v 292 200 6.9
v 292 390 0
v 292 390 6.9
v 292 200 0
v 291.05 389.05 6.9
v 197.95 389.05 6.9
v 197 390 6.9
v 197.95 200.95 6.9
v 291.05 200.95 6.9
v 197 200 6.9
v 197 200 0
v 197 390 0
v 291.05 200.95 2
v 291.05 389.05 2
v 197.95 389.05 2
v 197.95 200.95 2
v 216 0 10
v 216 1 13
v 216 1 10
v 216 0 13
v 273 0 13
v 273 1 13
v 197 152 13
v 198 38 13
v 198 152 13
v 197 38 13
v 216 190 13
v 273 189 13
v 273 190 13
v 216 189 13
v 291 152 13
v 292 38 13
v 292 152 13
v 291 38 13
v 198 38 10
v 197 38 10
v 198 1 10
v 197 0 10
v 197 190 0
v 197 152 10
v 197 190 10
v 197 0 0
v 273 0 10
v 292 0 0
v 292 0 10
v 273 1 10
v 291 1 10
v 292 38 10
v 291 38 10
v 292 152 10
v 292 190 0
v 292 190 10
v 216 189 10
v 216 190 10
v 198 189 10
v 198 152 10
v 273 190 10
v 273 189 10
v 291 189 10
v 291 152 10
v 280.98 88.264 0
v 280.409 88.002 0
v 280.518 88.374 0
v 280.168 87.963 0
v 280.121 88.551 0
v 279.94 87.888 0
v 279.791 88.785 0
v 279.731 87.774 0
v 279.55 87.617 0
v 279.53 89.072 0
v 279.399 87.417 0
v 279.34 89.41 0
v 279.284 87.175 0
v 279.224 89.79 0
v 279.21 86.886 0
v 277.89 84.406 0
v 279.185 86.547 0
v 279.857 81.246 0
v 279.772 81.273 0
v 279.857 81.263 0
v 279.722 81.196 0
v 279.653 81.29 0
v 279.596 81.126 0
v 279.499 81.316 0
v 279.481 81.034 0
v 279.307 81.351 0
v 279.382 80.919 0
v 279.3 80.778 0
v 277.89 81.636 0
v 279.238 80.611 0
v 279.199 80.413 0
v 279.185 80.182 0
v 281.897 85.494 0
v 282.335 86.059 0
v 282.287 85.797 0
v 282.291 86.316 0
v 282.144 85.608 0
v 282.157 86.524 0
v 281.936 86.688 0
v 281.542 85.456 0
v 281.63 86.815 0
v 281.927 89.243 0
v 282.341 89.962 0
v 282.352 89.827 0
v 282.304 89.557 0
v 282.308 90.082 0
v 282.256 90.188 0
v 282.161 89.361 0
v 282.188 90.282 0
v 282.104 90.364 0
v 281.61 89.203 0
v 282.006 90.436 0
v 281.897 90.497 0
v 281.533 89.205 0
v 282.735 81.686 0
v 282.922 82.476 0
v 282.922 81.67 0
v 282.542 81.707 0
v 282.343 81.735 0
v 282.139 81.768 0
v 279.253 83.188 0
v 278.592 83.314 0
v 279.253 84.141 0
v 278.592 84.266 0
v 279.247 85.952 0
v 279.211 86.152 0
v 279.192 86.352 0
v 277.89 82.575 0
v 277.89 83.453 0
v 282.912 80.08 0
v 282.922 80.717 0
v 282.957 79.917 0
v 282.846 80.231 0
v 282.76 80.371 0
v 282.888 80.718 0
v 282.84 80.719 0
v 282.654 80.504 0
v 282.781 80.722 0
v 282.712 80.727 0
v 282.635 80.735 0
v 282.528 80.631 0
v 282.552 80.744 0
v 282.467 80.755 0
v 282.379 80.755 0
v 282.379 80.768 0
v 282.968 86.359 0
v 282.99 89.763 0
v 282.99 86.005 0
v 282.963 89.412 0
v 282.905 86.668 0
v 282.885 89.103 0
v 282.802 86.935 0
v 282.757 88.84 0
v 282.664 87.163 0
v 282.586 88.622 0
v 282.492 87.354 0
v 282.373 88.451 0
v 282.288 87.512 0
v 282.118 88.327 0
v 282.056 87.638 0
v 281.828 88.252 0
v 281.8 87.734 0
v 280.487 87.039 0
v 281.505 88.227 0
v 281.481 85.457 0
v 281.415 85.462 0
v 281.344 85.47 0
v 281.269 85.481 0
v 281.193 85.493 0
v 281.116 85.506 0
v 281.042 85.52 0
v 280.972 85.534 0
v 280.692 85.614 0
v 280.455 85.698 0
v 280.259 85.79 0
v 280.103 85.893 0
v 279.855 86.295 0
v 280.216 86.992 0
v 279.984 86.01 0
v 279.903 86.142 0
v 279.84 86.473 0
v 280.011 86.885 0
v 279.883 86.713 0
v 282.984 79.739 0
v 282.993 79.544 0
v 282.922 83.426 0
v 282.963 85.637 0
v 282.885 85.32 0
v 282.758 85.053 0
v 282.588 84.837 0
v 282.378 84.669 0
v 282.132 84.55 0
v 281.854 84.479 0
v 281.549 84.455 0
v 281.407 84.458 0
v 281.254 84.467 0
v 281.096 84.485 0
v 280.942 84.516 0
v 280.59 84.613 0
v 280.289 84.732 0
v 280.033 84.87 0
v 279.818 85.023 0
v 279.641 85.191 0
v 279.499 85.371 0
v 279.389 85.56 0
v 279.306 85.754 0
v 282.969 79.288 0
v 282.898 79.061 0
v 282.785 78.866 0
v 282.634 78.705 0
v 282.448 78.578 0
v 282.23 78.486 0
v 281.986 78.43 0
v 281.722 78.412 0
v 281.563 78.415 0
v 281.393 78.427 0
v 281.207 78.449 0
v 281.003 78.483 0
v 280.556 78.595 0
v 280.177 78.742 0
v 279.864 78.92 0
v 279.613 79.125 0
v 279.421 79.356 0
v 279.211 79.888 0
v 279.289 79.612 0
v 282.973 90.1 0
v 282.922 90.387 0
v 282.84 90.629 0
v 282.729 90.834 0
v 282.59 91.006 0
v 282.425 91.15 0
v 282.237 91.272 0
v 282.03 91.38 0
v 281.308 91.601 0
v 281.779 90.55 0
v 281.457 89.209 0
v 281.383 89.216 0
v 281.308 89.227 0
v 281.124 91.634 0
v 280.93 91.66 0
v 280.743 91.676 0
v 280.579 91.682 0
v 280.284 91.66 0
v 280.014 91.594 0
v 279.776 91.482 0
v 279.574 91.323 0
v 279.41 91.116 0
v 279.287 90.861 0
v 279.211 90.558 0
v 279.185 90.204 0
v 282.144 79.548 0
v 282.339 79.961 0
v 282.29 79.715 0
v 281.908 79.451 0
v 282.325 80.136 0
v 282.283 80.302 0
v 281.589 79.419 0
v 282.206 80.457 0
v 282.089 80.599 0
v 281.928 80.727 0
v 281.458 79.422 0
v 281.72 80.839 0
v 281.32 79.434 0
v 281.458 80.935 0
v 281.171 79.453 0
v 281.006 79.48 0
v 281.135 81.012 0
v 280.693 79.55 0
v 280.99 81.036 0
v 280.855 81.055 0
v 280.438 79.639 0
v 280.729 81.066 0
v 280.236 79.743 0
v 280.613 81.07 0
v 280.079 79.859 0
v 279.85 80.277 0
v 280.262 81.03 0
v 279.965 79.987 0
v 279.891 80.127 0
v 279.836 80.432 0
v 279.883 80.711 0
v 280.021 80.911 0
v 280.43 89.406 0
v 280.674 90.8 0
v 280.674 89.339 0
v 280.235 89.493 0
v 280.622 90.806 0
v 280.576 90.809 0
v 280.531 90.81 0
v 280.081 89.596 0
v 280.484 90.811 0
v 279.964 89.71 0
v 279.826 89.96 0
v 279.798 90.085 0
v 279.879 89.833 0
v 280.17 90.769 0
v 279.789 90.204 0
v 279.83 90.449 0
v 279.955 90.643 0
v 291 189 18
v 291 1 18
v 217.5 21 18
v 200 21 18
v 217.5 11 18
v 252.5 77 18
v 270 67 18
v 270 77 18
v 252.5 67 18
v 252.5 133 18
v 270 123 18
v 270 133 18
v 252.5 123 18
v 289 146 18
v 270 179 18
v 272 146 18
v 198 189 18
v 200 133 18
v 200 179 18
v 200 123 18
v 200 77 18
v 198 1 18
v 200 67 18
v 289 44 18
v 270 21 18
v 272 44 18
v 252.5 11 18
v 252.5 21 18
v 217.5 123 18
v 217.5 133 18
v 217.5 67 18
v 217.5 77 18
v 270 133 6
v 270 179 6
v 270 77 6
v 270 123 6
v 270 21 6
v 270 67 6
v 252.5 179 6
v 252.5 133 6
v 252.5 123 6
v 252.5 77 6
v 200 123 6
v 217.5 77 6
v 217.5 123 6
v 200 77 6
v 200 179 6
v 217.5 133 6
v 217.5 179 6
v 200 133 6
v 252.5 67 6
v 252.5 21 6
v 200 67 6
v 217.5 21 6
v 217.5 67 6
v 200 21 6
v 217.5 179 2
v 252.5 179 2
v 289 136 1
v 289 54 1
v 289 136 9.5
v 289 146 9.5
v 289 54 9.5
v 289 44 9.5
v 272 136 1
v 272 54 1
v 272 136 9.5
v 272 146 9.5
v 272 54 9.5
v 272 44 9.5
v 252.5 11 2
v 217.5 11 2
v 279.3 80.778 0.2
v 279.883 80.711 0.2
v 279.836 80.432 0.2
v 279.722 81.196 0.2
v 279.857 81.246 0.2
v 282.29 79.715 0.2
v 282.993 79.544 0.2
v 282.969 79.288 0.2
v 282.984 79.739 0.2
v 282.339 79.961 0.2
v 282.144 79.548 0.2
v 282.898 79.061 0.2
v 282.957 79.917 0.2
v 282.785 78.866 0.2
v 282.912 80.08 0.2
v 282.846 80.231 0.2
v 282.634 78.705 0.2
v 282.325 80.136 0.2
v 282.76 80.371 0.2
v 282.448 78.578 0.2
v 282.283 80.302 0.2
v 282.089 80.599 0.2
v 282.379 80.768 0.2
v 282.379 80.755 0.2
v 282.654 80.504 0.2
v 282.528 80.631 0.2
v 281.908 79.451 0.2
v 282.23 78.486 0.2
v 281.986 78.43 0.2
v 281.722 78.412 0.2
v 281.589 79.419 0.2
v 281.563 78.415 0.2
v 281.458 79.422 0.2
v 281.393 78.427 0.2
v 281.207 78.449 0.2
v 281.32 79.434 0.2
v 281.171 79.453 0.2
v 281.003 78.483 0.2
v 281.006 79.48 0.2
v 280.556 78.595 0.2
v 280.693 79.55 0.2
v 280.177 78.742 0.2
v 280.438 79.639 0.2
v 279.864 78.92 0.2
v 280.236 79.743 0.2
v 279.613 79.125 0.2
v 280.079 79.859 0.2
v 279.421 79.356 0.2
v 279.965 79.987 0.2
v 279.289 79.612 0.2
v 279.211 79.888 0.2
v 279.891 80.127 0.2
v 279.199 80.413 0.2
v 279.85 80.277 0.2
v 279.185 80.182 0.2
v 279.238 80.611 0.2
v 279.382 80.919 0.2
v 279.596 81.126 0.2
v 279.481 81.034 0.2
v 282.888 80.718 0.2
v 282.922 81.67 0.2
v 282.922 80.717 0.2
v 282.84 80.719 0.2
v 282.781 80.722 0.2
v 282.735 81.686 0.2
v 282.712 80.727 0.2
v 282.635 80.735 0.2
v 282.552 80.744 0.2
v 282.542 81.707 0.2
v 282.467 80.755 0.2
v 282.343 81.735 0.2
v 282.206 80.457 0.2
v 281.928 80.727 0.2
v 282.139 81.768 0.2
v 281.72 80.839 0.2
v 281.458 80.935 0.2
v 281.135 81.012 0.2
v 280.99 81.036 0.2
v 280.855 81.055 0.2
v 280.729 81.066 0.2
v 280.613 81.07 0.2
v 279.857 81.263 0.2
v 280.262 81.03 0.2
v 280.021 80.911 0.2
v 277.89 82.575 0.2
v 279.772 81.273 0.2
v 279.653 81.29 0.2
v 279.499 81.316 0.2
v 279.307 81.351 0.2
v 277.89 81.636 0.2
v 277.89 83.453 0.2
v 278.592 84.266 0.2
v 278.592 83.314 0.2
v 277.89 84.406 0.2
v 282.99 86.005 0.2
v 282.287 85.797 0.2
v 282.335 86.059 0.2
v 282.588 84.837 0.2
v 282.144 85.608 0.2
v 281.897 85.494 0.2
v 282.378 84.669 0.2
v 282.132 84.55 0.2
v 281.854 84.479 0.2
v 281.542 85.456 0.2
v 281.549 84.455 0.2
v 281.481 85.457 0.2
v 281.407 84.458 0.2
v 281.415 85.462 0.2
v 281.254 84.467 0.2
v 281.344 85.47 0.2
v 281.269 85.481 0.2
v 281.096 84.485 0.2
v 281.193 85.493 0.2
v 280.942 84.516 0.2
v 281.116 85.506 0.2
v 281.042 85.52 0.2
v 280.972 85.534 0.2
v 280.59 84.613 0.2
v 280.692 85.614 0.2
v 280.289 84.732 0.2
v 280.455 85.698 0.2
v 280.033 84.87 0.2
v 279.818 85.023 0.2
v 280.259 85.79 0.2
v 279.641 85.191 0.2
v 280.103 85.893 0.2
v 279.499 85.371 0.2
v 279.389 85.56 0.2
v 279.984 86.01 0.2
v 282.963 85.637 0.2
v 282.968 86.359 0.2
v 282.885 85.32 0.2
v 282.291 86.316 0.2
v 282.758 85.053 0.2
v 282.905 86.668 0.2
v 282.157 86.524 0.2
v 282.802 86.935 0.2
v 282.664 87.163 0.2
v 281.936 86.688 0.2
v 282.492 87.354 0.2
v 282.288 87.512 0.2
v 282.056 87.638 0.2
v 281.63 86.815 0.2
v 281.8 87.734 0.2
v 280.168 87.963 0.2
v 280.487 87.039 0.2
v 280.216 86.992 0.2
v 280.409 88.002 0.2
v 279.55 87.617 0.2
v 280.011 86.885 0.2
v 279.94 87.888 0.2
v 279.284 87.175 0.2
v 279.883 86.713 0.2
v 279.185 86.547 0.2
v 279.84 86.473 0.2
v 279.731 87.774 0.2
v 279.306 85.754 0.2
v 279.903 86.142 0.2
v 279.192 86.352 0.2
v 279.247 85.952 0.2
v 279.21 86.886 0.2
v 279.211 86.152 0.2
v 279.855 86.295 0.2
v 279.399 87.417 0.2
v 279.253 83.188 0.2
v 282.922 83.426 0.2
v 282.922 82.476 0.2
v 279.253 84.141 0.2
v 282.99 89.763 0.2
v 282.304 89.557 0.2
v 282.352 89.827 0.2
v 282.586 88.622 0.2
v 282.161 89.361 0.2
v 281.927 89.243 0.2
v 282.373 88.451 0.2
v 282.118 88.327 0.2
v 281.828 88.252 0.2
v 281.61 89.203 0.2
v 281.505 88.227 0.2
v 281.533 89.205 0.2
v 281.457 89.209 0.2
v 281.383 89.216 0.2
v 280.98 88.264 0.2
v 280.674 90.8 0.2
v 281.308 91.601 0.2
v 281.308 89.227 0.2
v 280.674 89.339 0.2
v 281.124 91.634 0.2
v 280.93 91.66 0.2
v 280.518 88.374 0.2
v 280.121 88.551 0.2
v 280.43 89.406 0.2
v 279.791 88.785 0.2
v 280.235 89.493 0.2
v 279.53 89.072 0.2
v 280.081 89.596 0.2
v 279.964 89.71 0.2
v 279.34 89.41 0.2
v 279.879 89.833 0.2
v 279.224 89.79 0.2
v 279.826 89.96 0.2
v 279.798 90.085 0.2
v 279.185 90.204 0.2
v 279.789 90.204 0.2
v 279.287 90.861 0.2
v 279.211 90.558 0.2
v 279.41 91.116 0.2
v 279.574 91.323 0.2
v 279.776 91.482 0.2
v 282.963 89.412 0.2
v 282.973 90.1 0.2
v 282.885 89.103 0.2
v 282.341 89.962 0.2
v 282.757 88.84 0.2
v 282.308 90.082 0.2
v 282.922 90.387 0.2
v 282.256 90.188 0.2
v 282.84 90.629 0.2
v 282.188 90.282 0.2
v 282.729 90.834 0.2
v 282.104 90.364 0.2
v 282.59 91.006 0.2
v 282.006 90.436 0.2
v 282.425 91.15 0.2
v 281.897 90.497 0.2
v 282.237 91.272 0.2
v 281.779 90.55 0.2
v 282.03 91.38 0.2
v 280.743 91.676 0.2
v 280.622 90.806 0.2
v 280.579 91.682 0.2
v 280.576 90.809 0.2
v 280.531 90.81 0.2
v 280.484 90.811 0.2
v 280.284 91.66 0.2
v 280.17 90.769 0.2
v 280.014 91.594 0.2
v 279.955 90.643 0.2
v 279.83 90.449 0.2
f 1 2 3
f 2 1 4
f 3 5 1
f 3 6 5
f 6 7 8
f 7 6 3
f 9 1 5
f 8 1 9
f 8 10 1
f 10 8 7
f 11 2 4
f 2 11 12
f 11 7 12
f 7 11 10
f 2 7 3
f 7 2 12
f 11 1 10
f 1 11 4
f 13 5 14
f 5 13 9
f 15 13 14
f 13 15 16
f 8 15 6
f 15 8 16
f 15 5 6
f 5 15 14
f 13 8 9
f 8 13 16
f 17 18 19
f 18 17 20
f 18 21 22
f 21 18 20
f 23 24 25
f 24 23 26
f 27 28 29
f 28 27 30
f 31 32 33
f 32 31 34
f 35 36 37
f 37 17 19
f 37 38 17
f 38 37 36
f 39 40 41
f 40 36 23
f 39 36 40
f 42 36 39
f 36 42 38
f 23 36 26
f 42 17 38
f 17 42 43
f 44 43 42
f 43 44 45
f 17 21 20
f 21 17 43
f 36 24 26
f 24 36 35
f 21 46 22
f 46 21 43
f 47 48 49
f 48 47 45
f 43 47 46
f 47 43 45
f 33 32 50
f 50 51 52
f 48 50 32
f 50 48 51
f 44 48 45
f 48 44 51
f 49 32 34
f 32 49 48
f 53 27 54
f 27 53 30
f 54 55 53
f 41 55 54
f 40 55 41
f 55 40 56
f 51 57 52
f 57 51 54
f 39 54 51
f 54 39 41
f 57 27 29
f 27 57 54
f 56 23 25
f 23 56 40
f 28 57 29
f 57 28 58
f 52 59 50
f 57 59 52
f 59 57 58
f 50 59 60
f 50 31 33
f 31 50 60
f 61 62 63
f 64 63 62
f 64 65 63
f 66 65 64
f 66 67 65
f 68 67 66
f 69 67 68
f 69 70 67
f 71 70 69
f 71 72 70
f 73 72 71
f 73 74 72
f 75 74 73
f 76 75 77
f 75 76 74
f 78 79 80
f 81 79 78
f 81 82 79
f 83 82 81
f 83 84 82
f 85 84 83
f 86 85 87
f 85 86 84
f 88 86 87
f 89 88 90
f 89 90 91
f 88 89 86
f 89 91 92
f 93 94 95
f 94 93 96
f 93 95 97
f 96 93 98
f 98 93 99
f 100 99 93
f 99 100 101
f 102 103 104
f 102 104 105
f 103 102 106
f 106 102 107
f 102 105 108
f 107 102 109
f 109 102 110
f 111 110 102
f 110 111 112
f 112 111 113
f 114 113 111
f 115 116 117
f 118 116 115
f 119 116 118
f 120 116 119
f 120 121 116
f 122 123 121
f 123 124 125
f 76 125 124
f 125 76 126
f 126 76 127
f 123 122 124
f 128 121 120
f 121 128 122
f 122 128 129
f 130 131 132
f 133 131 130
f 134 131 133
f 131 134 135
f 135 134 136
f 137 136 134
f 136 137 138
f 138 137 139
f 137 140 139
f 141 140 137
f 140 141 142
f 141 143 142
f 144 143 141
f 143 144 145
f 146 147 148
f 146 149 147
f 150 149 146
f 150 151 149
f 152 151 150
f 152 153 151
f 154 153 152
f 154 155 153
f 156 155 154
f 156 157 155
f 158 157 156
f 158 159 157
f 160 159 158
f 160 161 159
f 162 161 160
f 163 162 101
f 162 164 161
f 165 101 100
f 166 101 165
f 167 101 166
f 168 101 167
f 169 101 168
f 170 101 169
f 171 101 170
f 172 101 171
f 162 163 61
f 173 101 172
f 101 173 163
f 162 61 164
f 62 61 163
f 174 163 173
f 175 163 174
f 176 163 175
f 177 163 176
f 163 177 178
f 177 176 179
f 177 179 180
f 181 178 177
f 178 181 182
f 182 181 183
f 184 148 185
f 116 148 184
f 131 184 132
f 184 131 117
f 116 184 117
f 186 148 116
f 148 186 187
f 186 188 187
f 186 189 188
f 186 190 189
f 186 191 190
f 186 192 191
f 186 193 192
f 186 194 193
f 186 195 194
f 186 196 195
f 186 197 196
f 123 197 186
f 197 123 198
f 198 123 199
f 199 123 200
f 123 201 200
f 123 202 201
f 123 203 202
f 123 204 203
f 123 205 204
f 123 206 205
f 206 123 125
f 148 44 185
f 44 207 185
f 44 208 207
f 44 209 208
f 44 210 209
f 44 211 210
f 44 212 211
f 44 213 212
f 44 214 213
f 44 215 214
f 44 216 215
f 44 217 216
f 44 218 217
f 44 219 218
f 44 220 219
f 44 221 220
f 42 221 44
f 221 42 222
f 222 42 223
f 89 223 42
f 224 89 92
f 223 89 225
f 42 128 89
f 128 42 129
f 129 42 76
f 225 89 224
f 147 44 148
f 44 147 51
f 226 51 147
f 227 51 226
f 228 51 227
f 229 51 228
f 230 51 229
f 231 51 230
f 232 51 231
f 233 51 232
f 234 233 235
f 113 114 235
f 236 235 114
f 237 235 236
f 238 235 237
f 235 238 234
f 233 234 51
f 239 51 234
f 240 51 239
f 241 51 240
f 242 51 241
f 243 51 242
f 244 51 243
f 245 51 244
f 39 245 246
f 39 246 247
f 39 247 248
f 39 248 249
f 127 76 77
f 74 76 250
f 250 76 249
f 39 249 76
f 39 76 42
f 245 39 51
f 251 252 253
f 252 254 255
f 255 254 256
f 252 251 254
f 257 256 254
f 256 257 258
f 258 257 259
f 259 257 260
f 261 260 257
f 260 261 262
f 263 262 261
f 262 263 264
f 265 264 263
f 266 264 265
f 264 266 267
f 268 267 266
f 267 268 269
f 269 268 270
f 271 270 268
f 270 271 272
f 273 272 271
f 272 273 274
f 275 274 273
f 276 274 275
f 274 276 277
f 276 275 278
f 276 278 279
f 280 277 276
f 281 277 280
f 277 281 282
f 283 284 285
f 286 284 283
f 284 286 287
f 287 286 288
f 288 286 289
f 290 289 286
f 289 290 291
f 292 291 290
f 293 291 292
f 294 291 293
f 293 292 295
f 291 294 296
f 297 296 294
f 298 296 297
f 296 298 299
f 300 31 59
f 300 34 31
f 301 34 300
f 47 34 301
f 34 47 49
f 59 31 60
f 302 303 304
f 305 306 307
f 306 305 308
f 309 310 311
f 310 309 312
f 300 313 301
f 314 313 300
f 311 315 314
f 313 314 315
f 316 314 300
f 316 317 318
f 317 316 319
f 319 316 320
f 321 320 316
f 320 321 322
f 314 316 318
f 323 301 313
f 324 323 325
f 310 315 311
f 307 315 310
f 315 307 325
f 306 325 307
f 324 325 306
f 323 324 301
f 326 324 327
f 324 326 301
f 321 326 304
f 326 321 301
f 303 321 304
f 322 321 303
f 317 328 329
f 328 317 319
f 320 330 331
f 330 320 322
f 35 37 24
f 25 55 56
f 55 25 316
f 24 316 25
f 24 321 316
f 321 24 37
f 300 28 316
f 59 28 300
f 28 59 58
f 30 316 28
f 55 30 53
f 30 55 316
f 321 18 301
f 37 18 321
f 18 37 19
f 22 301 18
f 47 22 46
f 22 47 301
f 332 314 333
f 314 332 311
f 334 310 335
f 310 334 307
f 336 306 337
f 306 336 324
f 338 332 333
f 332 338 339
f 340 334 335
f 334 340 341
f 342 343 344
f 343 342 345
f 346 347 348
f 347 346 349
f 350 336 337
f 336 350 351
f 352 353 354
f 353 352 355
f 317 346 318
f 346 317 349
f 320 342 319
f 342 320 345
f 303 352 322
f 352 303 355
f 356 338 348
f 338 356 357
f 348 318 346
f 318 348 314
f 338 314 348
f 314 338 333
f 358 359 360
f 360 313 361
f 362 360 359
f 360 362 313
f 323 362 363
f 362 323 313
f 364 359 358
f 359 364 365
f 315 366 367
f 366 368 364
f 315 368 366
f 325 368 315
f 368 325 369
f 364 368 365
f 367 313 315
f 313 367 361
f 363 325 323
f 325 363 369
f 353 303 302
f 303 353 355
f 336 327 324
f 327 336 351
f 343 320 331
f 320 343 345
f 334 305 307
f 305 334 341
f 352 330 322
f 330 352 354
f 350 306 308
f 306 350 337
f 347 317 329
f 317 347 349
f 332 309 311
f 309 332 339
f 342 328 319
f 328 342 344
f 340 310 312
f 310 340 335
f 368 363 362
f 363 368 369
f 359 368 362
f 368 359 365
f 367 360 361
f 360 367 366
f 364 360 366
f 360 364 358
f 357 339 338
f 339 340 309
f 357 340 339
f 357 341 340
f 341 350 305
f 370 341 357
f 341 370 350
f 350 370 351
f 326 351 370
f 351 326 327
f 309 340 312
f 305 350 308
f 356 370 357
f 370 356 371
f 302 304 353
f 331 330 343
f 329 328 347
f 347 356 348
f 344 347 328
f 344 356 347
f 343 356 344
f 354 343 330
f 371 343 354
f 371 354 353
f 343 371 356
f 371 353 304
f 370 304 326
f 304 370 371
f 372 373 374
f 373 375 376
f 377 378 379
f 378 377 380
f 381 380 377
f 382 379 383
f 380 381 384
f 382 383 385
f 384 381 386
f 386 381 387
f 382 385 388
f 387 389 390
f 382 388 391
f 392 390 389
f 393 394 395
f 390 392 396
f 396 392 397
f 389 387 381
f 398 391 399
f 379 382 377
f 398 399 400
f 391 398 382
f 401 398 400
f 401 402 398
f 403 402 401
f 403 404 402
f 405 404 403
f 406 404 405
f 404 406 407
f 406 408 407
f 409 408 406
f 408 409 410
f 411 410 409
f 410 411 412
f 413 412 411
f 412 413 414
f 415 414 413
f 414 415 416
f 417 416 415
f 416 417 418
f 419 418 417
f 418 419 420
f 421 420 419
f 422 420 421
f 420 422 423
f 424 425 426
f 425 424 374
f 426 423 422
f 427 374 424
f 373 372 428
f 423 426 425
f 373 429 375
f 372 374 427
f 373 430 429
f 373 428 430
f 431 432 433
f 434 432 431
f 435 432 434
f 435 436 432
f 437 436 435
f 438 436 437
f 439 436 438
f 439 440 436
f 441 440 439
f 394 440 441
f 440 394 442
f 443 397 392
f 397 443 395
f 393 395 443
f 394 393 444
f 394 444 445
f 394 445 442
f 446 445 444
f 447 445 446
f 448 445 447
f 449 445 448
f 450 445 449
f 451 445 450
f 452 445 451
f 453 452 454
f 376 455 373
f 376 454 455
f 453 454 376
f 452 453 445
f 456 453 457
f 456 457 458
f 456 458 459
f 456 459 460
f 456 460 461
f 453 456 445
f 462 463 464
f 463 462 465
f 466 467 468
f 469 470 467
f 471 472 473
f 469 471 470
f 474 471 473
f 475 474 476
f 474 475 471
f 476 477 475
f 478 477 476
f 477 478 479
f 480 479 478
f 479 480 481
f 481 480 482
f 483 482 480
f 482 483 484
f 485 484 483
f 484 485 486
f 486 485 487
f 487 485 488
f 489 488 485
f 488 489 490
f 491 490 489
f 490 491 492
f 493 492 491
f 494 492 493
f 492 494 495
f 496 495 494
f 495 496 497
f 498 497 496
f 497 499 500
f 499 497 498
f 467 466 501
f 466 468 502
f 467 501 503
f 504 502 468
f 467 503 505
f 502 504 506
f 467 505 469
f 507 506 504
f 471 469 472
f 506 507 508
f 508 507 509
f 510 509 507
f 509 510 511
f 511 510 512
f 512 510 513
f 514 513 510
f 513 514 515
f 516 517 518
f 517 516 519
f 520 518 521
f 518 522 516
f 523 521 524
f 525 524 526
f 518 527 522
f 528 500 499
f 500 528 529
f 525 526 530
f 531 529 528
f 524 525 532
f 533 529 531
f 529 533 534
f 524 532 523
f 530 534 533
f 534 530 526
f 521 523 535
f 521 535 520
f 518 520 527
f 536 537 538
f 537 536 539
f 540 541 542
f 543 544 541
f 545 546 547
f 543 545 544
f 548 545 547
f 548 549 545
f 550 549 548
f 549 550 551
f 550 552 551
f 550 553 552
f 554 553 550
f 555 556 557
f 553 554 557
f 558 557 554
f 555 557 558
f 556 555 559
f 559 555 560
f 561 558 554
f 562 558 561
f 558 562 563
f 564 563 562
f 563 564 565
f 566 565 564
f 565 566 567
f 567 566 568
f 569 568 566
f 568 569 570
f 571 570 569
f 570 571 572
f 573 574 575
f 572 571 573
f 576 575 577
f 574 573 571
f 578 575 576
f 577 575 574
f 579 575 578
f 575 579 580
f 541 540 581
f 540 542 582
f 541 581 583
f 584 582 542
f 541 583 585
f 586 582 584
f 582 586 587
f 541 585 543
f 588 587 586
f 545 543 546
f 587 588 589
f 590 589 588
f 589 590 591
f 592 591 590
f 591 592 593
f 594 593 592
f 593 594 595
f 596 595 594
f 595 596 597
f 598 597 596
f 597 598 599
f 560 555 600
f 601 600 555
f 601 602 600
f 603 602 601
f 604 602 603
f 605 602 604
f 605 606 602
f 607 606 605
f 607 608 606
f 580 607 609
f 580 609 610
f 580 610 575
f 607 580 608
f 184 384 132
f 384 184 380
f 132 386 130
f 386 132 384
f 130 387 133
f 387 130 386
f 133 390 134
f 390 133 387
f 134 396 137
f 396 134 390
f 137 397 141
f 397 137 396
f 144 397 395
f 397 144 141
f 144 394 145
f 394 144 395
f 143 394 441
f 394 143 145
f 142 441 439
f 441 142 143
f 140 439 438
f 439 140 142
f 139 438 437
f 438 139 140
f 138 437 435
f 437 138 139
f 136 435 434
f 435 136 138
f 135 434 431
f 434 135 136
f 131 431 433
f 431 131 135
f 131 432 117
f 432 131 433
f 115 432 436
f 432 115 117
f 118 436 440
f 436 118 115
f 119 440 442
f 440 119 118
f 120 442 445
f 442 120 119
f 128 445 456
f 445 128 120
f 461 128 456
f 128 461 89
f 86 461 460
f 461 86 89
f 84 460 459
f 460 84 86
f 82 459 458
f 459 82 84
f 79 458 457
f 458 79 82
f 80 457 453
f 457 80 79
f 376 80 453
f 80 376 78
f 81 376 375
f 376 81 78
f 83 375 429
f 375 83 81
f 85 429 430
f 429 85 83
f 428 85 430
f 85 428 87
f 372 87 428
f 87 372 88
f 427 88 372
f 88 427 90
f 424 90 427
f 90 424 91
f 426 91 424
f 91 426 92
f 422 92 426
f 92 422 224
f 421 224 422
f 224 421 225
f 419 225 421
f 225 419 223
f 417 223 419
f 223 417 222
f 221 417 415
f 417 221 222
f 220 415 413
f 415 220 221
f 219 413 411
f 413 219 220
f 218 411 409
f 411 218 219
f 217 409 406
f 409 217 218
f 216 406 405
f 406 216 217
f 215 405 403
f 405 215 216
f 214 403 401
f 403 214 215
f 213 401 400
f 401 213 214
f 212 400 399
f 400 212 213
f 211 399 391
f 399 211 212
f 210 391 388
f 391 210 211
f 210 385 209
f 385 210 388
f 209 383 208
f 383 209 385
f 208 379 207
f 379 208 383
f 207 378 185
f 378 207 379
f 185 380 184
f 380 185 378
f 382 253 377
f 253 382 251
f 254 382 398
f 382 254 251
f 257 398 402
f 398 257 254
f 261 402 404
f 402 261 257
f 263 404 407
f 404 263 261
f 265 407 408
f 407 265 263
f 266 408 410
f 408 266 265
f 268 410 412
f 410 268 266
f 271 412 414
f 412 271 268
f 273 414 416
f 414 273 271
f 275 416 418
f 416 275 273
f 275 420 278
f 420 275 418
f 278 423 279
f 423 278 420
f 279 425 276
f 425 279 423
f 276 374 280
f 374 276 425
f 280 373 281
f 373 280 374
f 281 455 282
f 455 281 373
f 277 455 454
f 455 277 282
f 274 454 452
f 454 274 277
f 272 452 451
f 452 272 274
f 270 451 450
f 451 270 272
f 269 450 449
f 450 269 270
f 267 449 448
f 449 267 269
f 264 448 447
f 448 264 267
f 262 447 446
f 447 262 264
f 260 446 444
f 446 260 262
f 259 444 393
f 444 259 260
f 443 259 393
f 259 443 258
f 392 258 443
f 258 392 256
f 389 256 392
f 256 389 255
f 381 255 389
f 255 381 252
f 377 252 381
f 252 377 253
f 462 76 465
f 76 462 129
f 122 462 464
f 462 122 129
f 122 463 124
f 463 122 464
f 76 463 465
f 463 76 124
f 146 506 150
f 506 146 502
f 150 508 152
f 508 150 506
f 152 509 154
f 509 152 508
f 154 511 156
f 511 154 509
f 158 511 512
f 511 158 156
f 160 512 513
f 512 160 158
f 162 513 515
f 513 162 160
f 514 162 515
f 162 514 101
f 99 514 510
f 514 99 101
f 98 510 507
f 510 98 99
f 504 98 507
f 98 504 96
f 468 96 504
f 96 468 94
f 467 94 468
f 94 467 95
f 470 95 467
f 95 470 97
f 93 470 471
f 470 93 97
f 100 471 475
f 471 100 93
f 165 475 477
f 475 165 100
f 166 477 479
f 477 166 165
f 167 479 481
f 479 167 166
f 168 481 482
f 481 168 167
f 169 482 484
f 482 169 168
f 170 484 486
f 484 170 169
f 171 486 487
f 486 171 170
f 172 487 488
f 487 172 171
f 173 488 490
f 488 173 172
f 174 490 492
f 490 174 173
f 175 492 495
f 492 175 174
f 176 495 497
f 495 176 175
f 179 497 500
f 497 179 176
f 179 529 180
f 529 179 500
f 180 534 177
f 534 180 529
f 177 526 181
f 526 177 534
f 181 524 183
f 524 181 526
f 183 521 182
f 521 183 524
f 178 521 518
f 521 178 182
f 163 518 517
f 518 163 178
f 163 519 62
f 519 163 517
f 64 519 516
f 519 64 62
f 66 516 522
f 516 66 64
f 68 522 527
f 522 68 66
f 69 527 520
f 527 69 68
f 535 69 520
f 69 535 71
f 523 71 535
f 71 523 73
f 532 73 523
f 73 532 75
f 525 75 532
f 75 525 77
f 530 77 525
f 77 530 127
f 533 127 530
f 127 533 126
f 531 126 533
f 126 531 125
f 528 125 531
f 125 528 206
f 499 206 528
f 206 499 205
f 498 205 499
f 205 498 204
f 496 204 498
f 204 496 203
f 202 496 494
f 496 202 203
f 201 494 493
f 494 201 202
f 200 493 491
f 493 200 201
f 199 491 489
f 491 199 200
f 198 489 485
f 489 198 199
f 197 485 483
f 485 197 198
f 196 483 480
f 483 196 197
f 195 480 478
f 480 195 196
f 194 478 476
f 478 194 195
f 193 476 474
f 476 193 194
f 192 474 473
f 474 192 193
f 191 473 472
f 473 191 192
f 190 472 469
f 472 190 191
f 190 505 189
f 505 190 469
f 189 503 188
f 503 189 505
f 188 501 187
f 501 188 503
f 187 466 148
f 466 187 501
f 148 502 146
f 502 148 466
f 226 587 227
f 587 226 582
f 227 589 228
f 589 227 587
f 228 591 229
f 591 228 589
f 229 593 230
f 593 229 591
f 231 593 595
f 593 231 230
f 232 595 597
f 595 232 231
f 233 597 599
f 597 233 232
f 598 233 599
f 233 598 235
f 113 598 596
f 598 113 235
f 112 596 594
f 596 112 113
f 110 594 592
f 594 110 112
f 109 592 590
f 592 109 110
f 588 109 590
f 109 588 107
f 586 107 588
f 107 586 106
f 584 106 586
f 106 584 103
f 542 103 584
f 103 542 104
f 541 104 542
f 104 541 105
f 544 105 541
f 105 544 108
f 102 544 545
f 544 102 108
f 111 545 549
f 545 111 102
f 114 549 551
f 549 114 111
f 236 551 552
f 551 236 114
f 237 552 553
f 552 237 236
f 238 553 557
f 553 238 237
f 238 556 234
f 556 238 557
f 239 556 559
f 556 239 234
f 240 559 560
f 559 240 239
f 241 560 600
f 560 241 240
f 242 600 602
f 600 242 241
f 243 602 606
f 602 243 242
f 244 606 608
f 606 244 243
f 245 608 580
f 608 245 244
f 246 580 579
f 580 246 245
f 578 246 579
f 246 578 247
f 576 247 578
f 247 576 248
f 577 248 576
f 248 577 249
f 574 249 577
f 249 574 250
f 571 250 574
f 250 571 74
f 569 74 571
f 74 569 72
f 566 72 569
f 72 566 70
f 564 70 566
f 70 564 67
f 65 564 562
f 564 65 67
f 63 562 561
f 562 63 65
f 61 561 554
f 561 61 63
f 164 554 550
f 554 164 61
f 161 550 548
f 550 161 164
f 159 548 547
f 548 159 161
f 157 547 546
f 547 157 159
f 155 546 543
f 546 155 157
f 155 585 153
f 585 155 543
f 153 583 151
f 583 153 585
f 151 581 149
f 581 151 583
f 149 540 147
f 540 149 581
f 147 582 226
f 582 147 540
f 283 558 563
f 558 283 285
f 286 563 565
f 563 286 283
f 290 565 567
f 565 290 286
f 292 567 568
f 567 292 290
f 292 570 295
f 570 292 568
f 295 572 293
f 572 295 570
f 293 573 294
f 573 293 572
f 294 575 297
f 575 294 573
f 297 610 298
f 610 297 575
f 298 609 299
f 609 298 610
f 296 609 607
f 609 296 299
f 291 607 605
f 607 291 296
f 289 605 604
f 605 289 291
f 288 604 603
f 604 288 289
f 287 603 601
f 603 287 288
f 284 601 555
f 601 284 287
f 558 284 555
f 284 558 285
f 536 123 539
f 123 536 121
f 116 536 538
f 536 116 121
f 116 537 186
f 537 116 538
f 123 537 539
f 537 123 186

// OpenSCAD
include <boardgame_insert_toolkit_lib.scad>;


// This is a working example of the Boardgame Insert Toolkit used to create a single large box insert
// for the Z-Man game, Pandemic. It is designed for a printer that can print 290mm x 210mm x 28mm.
// See the two box version for an example of a design for smaller printers.
// 
data =
[
    [   "1",
        [
            [   "box_dimensions",                 [187, 190, 37.0] ],                       // float f -- default:[ 100, 100, 100]
            [ "enabled",                                    false ],

            [   "components",
                [
                    [   "hearts & cheese & status",
                        [
                            ["enabled",                     true ],                     // true | false
                            ["type",                        "tokens"],
                            ["compartment_size",            [ 60.0, 60.0, 20.0] ],
                            ["num_compartments",            [1, 3] ],
                            ["position",                    [122, 1 ] ],
                            ["label",
                                [
                                    ["text",                     "status"],             // default ""
                                    ["size",                     4],                    // default 4
                                ]
                            ]

                        ]
                    ],

                    [   "heroes",
                        [
                            ["enabled",                     true ],                     // true | false
                            ["type",                        ""],
                            ["compartment_size",            [ 30.0, 29.5, 35.0] ],
                            ["num_compartments",            [1, 6] ],
                            ["position",                    [1, 1 ] ],
                            ["label",
                                [
                                    ["text",                     "mouse"],
                                    ["size",                     4],
                                ]
                            ]
                        ]
                    ],

                    [   "rats",
                        [
                            ["enabled",                     true ],                     // true | false
                            ["type",                        ""],
                            ["compartment_size",            [ 37.0, 29.5, 35.0] ],
                            ["num_compartments",            [1, 6] ],
                            ["position",                    [32, 1 ] ],
                            ["label",
                                [
                                    ["text",                     "rat"],
                                    ["size",                     4],
                                ]
                            ]                            
                        ] 
                    ],

                    [   "centipede",
                        [
                            ["enabled",                     true ],                     // true | false
                            ["type",                        ""],
                            ["compartment_size",            [ 51.0, 35.0, 35.0] ],
                            ["num_compartments",            [1, 1] ],
                            ["position",                    [70, 106 ] ],
                            ["label",
                                [
                                    ["text",                     "centipede"],
                                    ["size",                     4],
                                ]
                            ]                            
                        ]
                    ],

                    [   "spider",
                        [
                            ["enabled",                     true ],                     // true | false
                            ["type",                        ""],
                            ["compartment_size",            [ 51.0, 40.0, 20.0] ],
                            ["num_compartments",            [1, 1] ],
                            ["position",                    [70, 143 ] ],
                            ["label",
                                [
                                    ["text",                     "spider"],
                                    ["size",                     4],
                                ]
                            ]                            
                        ]
                    ],

                    [   "roaches",
                        [
                            ["enabled",                     true ],                     // true | false
                            ["type",                        ""],
                            ["compartment_size",            [ 25.0, 25.0, 10.0] ],
                            ["num_compartments",            [2, 4] ],
                            ["position",                    [70, 1 ] ],
                            ["label",
                                [
                                    ["text",                     "roach"],
                                    ["size",                     4],
                                ]
                            ]                            
                        ]
                    ],

                    
                    // more components here...
                ]
            ],
        ]
    ],

    [   "2",
        [
            [   "box_dimensions",                 [93, 190, 20.0] ],                       // float f -- default:[ 100, 100, 100]
            [ "enabled",                                    false ],

            [   "components",
                [
                    [   "misc tokens",
                        [
                            ["enabled",                     true ],                     // true | false
                            ["type",                        "tokens"],
                            ["compartment_size",            [ 42.0, 60.0, 18.0] ],
                            ["num_compartments",            [2, 3] ],
                        ]
                    ],
                ]
            ],
        ]
    ],
    [   "3",
        [
            [   "box_dimensions",                 [95, 190, 18.0] ],                       // float f -- default:[ 100, 100, 100]
            [ "enabled",                                    true ],

            [   "components",
                [

                    [   "small cards",
                        [
                            ["enabled",                     true ],                     // true | false
                            ["type",                        "cards"],
                            ["compartment_size",            [ 70.0, 46.0, 12.0] ],
                            ["num_compartments",            [1, 3] ],
                            ["position",                    [ 1, "center" ] ],                         
                        ]
                    ],

                    [   "dice",
                        [
                            ["enabled",                     true ],                     // true | false
                            ["type",                        "chit_stack"],
                            ["compartment_size",            [ 17.0, 82.0, 17.0] ],
                            ["num_compartments",            [1, 1] ],
                            ["position",                    [-1, "center" ] ],
                            ["label",
                                [
                                    ["text",                     "dice"],
                                    ["size",                     5],
                                    ["rotation",                90],
                                ]
                            ]                            
                        ]
                    ],
 

                    
                    // more components here...
                ]
            ],
        ]
    ],
    [   "4",
        [
            [   "box_dimensions",                 [187, 95, 37.0] ],                       // float f -- default:[ 100, 100, 100]
            [ "enabled",                                    false ],

            [   "components",
                [
                    [   "cards",
                        [
                            ["type",                        "cards"],                   // "cards" | "chits" | "generic" -- default: "generic"
                            ["compartment_size",            [ 90.0, 65.0, 27.0] ],      // float f -- default:[ 10, 10, 10]
                            ["num_compartments",            [2, 1] ],                   // int i -- default: [1, 1]
                            ["enabled",                     true ],                     // true | false

                        ]
                    ],
                ]
            ],
        ]
    ],
    
];


// for printing control.
b_print_lid = true;
b_print_box = true;

b_print_box = "29cm box"; // isolate one box to print

MakeAll();
